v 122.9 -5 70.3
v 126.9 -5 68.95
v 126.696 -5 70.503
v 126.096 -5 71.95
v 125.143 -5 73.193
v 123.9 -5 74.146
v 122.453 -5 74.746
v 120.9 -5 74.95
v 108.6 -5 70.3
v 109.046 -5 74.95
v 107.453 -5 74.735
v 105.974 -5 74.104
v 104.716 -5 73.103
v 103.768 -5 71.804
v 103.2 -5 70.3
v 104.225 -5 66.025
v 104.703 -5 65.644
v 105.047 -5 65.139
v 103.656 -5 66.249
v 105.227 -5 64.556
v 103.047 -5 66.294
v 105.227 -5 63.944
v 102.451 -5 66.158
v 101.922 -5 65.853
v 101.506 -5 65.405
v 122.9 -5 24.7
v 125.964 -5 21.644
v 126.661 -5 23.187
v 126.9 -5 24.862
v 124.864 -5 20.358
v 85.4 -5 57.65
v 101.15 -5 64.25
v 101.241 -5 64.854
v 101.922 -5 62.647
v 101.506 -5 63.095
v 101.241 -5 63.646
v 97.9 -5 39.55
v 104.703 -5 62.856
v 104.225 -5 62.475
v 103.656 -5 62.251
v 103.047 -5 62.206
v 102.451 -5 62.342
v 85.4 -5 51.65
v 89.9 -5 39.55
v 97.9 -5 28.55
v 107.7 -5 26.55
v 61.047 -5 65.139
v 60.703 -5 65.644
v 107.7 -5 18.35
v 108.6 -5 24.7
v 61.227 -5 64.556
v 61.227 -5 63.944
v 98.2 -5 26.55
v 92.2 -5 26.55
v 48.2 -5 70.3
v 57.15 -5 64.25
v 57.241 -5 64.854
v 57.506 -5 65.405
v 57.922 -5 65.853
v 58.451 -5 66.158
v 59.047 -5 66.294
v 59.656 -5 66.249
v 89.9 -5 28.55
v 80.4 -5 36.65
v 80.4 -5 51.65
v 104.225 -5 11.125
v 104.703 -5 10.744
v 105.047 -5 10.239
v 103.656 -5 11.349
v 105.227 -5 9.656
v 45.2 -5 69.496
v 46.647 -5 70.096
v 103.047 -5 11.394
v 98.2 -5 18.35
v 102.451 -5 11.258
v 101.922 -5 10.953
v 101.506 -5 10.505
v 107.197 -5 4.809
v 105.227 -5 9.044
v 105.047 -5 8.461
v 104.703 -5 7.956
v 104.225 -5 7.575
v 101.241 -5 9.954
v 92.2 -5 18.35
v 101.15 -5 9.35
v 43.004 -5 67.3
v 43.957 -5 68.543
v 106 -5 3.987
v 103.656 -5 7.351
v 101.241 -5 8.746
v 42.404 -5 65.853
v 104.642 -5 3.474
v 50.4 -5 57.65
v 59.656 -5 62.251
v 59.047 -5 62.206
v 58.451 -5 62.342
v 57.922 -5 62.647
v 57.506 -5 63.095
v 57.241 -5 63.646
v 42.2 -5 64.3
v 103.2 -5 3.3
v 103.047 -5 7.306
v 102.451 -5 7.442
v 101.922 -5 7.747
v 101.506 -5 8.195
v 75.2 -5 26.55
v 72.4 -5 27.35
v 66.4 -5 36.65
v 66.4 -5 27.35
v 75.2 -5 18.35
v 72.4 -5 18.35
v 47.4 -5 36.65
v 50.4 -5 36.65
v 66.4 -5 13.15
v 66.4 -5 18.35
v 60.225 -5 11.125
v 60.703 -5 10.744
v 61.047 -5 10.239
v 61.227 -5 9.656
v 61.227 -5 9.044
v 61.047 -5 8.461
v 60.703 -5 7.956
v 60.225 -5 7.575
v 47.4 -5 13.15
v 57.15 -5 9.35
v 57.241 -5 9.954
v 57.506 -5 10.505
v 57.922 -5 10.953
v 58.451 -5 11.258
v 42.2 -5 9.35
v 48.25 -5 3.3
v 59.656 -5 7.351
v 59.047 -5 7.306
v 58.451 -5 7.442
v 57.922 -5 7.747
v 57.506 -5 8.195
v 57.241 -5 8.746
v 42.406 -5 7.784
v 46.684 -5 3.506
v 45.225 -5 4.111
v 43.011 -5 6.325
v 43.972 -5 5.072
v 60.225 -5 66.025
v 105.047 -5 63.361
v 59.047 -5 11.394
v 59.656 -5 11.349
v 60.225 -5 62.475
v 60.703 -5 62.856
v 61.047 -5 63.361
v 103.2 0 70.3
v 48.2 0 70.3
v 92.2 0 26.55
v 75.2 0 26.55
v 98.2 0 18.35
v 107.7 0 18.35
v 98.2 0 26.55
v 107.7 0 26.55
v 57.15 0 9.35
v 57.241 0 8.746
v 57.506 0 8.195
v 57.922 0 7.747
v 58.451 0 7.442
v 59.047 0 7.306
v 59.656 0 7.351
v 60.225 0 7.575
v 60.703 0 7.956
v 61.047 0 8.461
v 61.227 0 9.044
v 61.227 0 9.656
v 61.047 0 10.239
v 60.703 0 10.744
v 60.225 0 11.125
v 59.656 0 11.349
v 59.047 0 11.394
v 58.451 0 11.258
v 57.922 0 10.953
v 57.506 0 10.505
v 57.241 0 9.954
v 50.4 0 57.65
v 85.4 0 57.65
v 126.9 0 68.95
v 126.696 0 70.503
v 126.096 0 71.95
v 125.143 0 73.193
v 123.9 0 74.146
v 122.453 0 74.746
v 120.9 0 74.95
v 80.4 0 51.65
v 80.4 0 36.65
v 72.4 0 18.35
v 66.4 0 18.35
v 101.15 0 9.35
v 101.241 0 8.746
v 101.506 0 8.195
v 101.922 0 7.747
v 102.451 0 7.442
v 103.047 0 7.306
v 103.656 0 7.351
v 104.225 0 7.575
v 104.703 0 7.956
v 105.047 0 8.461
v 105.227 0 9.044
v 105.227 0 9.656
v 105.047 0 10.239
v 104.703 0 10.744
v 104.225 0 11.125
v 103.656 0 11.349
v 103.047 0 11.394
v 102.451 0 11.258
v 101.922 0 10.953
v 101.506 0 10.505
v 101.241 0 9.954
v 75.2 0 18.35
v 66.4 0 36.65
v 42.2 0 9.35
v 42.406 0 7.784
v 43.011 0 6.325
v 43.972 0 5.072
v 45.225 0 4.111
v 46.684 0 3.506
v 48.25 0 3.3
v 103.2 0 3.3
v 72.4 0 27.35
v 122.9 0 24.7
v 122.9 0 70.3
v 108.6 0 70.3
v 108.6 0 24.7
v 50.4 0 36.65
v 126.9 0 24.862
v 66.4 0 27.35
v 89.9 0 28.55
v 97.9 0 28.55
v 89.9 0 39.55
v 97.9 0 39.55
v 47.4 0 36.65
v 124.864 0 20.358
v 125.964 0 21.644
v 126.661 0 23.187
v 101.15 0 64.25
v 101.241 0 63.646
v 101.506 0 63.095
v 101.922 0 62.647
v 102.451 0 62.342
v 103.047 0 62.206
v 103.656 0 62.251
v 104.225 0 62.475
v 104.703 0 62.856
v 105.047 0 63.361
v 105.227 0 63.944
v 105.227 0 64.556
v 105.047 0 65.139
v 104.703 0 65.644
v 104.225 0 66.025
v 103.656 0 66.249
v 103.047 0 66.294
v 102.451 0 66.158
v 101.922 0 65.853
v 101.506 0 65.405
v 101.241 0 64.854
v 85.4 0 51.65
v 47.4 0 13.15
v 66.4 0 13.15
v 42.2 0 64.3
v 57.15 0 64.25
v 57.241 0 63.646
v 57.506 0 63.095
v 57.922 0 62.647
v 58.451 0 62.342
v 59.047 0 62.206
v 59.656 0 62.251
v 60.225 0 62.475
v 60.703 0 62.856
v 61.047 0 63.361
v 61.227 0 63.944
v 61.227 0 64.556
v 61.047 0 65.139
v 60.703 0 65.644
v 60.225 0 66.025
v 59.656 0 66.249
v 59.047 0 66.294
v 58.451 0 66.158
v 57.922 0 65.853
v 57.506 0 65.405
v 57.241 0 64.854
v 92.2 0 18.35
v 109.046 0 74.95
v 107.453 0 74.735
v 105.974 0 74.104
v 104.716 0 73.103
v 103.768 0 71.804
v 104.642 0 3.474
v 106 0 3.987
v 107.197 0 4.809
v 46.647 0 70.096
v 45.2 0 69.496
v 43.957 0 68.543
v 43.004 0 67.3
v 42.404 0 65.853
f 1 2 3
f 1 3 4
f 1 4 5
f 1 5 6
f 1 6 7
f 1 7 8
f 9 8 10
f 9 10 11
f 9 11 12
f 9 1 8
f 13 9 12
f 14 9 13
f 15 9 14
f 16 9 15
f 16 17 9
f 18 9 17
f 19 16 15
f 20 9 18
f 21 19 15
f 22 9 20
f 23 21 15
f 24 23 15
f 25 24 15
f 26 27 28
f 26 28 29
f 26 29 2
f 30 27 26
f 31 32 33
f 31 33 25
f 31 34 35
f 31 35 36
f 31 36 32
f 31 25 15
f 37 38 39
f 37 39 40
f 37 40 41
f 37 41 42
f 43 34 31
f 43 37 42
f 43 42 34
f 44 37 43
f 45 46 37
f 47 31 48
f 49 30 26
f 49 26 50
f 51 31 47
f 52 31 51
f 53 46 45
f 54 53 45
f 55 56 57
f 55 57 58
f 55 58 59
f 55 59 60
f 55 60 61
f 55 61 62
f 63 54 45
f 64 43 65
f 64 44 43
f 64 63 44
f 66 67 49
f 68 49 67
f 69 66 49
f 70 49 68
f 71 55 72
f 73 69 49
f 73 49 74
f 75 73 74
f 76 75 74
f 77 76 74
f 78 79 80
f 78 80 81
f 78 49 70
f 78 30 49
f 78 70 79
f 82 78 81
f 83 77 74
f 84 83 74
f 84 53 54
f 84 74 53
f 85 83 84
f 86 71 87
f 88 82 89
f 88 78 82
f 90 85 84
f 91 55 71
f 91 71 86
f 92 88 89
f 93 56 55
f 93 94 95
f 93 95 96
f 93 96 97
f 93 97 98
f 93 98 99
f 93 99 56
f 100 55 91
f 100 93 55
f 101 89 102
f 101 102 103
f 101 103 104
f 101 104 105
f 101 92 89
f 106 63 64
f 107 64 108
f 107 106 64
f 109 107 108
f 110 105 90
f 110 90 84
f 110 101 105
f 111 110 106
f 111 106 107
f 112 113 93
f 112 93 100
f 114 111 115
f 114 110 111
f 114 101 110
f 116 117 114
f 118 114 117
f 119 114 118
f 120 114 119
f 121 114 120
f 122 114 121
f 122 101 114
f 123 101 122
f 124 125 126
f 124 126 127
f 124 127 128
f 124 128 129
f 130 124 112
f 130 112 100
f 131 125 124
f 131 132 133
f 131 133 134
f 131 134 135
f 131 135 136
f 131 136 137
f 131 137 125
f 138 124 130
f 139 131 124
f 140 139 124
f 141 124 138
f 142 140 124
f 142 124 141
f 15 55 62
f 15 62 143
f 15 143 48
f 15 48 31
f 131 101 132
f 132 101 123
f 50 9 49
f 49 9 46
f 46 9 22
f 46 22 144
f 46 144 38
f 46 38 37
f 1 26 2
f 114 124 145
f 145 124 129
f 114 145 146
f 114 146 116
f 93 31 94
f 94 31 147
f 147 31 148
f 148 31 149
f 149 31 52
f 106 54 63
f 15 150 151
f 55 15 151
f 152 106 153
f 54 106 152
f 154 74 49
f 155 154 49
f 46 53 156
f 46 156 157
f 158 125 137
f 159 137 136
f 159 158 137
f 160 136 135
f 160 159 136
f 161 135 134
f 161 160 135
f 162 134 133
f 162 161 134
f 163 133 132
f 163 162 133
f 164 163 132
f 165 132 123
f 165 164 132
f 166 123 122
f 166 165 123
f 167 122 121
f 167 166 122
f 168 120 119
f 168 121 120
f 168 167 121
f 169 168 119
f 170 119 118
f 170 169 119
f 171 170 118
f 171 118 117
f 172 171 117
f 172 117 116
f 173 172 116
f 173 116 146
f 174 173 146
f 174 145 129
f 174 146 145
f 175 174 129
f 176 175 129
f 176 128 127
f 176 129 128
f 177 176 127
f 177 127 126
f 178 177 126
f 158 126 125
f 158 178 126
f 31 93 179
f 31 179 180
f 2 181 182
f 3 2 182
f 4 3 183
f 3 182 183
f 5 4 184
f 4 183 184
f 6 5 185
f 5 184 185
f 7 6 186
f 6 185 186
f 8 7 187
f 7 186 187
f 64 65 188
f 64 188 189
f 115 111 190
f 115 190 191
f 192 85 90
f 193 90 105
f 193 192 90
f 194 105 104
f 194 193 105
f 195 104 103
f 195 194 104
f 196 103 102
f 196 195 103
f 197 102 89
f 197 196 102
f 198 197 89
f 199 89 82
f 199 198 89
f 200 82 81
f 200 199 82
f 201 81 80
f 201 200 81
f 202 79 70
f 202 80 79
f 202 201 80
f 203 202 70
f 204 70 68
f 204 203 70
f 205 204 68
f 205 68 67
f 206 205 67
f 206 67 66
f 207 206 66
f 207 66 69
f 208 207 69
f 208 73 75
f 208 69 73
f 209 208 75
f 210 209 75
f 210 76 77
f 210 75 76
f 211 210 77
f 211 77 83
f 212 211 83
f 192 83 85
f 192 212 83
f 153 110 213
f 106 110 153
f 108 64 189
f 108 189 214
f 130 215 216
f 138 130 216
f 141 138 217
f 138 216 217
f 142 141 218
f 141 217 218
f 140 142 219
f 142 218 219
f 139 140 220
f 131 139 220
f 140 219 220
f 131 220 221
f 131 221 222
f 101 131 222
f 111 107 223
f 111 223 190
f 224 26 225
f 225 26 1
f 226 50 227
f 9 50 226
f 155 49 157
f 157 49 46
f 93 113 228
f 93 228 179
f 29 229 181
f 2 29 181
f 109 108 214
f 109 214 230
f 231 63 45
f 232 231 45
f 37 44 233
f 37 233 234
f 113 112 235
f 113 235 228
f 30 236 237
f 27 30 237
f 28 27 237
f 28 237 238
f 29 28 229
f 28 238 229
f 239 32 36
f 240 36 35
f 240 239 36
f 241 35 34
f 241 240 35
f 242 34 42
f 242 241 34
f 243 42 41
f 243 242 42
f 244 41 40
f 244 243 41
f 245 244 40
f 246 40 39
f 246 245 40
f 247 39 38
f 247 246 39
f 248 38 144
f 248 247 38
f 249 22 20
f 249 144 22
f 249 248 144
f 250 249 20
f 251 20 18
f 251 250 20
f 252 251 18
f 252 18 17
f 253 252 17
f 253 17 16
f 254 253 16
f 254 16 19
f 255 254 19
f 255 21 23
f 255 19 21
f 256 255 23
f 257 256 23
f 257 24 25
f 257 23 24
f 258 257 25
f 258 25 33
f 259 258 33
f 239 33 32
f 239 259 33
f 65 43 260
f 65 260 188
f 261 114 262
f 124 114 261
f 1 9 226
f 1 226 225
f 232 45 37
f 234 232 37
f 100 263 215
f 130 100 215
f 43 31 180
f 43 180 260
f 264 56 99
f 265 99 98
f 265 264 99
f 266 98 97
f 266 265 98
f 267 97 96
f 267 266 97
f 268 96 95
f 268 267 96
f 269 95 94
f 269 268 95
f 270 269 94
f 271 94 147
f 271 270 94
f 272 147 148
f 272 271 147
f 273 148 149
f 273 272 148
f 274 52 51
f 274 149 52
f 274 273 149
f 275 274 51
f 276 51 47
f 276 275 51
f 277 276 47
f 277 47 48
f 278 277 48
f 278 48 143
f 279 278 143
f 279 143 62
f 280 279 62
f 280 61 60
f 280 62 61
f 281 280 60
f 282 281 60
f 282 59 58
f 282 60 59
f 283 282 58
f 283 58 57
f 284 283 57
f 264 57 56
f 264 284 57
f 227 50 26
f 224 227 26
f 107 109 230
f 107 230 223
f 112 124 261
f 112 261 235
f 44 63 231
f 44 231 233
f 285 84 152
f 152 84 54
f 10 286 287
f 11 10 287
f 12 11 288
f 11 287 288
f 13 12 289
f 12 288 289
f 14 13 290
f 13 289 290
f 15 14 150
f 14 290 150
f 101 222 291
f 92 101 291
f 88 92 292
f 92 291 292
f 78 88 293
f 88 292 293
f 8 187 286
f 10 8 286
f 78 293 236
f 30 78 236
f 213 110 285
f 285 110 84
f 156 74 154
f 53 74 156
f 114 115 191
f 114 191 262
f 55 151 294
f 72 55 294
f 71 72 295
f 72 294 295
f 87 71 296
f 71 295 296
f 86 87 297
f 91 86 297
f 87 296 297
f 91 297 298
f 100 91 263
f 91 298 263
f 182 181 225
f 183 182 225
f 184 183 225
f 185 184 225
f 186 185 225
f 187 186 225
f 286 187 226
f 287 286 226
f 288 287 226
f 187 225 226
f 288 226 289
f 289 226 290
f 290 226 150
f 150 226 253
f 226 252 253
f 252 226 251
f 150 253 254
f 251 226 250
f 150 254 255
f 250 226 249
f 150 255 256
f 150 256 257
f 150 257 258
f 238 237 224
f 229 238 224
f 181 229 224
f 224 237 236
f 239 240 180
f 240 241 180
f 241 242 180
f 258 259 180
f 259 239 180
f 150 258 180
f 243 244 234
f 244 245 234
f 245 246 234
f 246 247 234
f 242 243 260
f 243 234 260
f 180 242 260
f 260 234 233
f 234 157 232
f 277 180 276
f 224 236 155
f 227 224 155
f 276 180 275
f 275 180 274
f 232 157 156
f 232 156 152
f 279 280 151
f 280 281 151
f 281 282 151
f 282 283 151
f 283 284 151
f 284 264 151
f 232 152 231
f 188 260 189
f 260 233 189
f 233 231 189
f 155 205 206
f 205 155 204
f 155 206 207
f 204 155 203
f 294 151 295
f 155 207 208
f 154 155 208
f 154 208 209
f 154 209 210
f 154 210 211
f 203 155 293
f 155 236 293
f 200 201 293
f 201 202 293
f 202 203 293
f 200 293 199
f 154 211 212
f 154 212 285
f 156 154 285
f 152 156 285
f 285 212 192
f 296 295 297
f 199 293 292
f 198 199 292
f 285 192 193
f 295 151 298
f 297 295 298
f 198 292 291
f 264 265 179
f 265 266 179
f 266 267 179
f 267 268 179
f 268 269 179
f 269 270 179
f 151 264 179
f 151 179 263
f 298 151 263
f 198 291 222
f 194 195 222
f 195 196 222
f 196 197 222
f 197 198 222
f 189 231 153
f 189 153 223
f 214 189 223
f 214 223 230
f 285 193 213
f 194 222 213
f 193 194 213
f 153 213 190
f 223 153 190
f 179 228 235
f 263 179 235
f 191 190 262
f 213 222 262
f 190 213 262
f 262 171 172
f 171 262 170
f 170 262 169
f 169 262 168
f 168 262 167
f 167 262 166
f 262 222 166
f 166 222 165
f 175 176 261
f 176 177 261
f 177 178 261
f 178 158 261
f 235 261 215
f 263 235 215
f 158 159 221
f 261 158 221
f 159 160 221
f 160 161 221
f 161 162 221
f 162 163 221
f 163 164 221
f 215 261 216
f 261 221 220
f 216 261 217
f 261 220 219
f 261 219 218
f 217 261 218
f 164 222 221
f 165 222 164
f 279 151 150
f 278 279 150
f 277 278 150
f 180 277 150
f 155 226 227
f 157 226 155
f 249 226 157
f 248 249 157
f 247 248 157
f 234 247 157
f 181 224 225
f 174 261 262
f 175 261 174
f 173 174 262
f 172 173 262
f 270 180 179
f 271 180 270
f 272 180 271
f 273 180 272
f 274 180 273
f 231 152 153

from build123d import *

# Parameters (mm, degrees)
SKETCH_2_R          = 6.05
SKETCH_2_R_2        = 2.05
EXTRUDE_1_DEPTH     = 5
EXTRUDE_1_2_DEPTH   = 5
EXTRUDE_1_3_DEPTH   = 5
EXTRUDE_1_4_DEPTH   = 5
SKETCH_6_R          = 2.05
EXTRUDE_1_5_DEPTH   = 5
SKETCH_7_W          = 14.3
SKETCH_7_H          = 45.6
SKETCH_7_W_2        = 9.5
SKETCH_7_H_2        = 8.2
SKETCH_7_W_3        = 8
SKETCH_7_H_3        = 11
SKETCH_7_W_4        = 17
CUT_EXTRUDE_1_DEPTH = 5


with BuildPart() as part:
    # 草图2 → Extrude 1 (new body)
    with BuildSketch(Plane(origin=(0, 0, 0), x_dir=(-1, 0, 0), z_dir=(0, -1, 0))):
        with Locations((-103.2, -9.35)):
            Circle(SKETCH_2_R)
        with Locations((-103.2, -9.35)):
            Circle(SKETCH_2_R_2, mode=Mode.SUBTRACT)
    extrude(amount=EXTRUDE_1_DEPTH)



with BuildPart() as body_2:
    # 草图2 → Extrude 1 2 (new body)
    with BuildSketch(Plane(origin=(0, 0, 0), x_dir=(-1, 0, 0), z_dir=(0, -1, 0))):
        with Locations((-59.2, -9.35)):
            Circle(SKETCH_2_R)
        with Locations((-59.2, -9.35)):
            Circle(SKETCH_2_R_2, mode=Mode.SUBTRACT)
    extrude(amount=EXTRUDE_1_2_DEPTH)


with BuildPart() as body_3:
    # 草图2 → Extrude 1 3 (new body)
    with BuildSketch(Plane(origin=(0, 0, 0), x_dir=(-1, 0, 0), z_dir=(0, -1, 0))):
        with Locations((-59.2, -64.25)):
            Circle(SKETCH_2_R)
        with Locations((-59.2, -64.25)):
            Circle(SKETCH_2_R_2, mode=Mode.SUBTRACT)
    extrude(amount=EXTRUDE_1_3_DEPTH)


with BuildPart() as body_4:
    # 草图2 → Extrude 1 4 (new body)
    with BuildSketch(Plane(origin=(0, 0, 0), x_dir=(-1, 0, 0), z_dir=(0, -1, 0))):
        with Locations((-103.2, -64.25)):
            Circle(SKETCH_2_R)
        with Locations((-103.2, -64.25)):
            Circle(SKETCH_2_R_2, mode=Mode.SUBTRACT)
    extrude(amount=EXTRUDE_1_4_DEPTH)


with BuildPart() as part_1:
    add(part.part)

    add(body_2.part)  # Extrude 1 5 merges body 2

    add(body_3.part)  # Extrude 1 5 merges body 3

    add(body_4.part)  # Extrude 1 5 merges body 4
    # 草图6 → Extrude 1 5 (add)
    with BuildSketch(Plane(origin=(0, 0, 0), x_dir=(1, 0, 0), z_dir=(0, 1, 0))):
        with BuildLine():
            Line((107.197188412, -4.808526143), (124.864153797, -20.358145394))
            ThreePointArc((124.864153797, -20.358145394), (126.367399875, -22.390742927), (126.9, -24.862086409))
            Line((126.9, -24.862086409), (126.9, -68.95))
            ThreePointArc((126.9, -68.95), (125.142640687, -73.192640687), (120.9, -74.95))
            Line((120.9, -74.95), (109.046152581, -74.95))
            ThreePointArc((109.046152581, -74.95), (105.311182702, -73.645742753), (103.2, -70.3))
            Line((103.2, -70.3), (48.2, -70.3))
            ThreePointArc((48.2, -70.3), (43.957359313, -68.542640687), (42.2, -64.3))
            Line((42.2, -64.3), (42.2, -9.35))
            ThreePointArc((42.2, -9.35), (43.972003974, -5.072003974), (48.25, -3.3))
            Line((48.25, -3.3), (59.2, -3.3))
            Line((59.2, -3.3), (103.2, -3.3))
            ThreePointArc((103.2, -3.3), (105.336186224, -3.689681244), (107.197188412, -4.808526143))
        make_face()
        with Locations(Location((103.2, -9.35, 0), (0, 0, 270))):
            Circle(SKETCH_6_R, mode=Mode.SUBTRACT)
        with Locations(Location((103.2, -64.25, 0), (0, 0, 270))):
            Circle(SKETCH_6_R, mode=Mode.SUBTRACT)
        with Locations(Location((59.2, -64.25, 0), (0, 0, 270))):
            Circle(SKETCH_6_R, mode=Mode.SUBTRACT)
        with Locations(Location((59.2, -9.35, 0), (0, 0, 90))):
            Circle(SKETCH_6_R, mode=Mode.SUBTRACT)
    extrude(amount=-EXTRUDE_1_5_DEPTH)

    # 草图7 → 切除-拉伸1 (cut)
    with BuildSketch(Plane(origin=(0, -5, 3), x_dir=(1, 0, 0), z_dir=(0, -1, 0))):
        with Locations((115.75, 44.5)):
            Rectangle(SKETCH_7_W, SKETCH_7_H)
        with Locations((102.95, 19.45)):
            Rectangle(SKETCH_7_W_2, SKETCH_7_H_2)
        with Locations((93.9, 31.05)):
            Rectangle(SKETCH_7_W_3, SKETCH_7_H_3)
        with Locations((83.7, 19.45)):
            Rectangle(SKETCH_7_W_4, SKETCH_7_H_2)
        Polygon((72.4, 24.35), (72.4, 15.35), (66.4, 15.35), (66.4, 10.15), (47.4, 10.15), (47.4, 33.65), (50.4, 33.65), (50.4, 54.65), (85.4, 54.65), (85.4, 48.65), (80.4, 48.65), (80.4, 33.65), (66.4, 33.65), (66.4, 24.35), align=None)
    extrude(amount=-CUT_EXTRUDE_1_DEPTH, mode=Mode.SUBTRACT)


solid = part_1.part
